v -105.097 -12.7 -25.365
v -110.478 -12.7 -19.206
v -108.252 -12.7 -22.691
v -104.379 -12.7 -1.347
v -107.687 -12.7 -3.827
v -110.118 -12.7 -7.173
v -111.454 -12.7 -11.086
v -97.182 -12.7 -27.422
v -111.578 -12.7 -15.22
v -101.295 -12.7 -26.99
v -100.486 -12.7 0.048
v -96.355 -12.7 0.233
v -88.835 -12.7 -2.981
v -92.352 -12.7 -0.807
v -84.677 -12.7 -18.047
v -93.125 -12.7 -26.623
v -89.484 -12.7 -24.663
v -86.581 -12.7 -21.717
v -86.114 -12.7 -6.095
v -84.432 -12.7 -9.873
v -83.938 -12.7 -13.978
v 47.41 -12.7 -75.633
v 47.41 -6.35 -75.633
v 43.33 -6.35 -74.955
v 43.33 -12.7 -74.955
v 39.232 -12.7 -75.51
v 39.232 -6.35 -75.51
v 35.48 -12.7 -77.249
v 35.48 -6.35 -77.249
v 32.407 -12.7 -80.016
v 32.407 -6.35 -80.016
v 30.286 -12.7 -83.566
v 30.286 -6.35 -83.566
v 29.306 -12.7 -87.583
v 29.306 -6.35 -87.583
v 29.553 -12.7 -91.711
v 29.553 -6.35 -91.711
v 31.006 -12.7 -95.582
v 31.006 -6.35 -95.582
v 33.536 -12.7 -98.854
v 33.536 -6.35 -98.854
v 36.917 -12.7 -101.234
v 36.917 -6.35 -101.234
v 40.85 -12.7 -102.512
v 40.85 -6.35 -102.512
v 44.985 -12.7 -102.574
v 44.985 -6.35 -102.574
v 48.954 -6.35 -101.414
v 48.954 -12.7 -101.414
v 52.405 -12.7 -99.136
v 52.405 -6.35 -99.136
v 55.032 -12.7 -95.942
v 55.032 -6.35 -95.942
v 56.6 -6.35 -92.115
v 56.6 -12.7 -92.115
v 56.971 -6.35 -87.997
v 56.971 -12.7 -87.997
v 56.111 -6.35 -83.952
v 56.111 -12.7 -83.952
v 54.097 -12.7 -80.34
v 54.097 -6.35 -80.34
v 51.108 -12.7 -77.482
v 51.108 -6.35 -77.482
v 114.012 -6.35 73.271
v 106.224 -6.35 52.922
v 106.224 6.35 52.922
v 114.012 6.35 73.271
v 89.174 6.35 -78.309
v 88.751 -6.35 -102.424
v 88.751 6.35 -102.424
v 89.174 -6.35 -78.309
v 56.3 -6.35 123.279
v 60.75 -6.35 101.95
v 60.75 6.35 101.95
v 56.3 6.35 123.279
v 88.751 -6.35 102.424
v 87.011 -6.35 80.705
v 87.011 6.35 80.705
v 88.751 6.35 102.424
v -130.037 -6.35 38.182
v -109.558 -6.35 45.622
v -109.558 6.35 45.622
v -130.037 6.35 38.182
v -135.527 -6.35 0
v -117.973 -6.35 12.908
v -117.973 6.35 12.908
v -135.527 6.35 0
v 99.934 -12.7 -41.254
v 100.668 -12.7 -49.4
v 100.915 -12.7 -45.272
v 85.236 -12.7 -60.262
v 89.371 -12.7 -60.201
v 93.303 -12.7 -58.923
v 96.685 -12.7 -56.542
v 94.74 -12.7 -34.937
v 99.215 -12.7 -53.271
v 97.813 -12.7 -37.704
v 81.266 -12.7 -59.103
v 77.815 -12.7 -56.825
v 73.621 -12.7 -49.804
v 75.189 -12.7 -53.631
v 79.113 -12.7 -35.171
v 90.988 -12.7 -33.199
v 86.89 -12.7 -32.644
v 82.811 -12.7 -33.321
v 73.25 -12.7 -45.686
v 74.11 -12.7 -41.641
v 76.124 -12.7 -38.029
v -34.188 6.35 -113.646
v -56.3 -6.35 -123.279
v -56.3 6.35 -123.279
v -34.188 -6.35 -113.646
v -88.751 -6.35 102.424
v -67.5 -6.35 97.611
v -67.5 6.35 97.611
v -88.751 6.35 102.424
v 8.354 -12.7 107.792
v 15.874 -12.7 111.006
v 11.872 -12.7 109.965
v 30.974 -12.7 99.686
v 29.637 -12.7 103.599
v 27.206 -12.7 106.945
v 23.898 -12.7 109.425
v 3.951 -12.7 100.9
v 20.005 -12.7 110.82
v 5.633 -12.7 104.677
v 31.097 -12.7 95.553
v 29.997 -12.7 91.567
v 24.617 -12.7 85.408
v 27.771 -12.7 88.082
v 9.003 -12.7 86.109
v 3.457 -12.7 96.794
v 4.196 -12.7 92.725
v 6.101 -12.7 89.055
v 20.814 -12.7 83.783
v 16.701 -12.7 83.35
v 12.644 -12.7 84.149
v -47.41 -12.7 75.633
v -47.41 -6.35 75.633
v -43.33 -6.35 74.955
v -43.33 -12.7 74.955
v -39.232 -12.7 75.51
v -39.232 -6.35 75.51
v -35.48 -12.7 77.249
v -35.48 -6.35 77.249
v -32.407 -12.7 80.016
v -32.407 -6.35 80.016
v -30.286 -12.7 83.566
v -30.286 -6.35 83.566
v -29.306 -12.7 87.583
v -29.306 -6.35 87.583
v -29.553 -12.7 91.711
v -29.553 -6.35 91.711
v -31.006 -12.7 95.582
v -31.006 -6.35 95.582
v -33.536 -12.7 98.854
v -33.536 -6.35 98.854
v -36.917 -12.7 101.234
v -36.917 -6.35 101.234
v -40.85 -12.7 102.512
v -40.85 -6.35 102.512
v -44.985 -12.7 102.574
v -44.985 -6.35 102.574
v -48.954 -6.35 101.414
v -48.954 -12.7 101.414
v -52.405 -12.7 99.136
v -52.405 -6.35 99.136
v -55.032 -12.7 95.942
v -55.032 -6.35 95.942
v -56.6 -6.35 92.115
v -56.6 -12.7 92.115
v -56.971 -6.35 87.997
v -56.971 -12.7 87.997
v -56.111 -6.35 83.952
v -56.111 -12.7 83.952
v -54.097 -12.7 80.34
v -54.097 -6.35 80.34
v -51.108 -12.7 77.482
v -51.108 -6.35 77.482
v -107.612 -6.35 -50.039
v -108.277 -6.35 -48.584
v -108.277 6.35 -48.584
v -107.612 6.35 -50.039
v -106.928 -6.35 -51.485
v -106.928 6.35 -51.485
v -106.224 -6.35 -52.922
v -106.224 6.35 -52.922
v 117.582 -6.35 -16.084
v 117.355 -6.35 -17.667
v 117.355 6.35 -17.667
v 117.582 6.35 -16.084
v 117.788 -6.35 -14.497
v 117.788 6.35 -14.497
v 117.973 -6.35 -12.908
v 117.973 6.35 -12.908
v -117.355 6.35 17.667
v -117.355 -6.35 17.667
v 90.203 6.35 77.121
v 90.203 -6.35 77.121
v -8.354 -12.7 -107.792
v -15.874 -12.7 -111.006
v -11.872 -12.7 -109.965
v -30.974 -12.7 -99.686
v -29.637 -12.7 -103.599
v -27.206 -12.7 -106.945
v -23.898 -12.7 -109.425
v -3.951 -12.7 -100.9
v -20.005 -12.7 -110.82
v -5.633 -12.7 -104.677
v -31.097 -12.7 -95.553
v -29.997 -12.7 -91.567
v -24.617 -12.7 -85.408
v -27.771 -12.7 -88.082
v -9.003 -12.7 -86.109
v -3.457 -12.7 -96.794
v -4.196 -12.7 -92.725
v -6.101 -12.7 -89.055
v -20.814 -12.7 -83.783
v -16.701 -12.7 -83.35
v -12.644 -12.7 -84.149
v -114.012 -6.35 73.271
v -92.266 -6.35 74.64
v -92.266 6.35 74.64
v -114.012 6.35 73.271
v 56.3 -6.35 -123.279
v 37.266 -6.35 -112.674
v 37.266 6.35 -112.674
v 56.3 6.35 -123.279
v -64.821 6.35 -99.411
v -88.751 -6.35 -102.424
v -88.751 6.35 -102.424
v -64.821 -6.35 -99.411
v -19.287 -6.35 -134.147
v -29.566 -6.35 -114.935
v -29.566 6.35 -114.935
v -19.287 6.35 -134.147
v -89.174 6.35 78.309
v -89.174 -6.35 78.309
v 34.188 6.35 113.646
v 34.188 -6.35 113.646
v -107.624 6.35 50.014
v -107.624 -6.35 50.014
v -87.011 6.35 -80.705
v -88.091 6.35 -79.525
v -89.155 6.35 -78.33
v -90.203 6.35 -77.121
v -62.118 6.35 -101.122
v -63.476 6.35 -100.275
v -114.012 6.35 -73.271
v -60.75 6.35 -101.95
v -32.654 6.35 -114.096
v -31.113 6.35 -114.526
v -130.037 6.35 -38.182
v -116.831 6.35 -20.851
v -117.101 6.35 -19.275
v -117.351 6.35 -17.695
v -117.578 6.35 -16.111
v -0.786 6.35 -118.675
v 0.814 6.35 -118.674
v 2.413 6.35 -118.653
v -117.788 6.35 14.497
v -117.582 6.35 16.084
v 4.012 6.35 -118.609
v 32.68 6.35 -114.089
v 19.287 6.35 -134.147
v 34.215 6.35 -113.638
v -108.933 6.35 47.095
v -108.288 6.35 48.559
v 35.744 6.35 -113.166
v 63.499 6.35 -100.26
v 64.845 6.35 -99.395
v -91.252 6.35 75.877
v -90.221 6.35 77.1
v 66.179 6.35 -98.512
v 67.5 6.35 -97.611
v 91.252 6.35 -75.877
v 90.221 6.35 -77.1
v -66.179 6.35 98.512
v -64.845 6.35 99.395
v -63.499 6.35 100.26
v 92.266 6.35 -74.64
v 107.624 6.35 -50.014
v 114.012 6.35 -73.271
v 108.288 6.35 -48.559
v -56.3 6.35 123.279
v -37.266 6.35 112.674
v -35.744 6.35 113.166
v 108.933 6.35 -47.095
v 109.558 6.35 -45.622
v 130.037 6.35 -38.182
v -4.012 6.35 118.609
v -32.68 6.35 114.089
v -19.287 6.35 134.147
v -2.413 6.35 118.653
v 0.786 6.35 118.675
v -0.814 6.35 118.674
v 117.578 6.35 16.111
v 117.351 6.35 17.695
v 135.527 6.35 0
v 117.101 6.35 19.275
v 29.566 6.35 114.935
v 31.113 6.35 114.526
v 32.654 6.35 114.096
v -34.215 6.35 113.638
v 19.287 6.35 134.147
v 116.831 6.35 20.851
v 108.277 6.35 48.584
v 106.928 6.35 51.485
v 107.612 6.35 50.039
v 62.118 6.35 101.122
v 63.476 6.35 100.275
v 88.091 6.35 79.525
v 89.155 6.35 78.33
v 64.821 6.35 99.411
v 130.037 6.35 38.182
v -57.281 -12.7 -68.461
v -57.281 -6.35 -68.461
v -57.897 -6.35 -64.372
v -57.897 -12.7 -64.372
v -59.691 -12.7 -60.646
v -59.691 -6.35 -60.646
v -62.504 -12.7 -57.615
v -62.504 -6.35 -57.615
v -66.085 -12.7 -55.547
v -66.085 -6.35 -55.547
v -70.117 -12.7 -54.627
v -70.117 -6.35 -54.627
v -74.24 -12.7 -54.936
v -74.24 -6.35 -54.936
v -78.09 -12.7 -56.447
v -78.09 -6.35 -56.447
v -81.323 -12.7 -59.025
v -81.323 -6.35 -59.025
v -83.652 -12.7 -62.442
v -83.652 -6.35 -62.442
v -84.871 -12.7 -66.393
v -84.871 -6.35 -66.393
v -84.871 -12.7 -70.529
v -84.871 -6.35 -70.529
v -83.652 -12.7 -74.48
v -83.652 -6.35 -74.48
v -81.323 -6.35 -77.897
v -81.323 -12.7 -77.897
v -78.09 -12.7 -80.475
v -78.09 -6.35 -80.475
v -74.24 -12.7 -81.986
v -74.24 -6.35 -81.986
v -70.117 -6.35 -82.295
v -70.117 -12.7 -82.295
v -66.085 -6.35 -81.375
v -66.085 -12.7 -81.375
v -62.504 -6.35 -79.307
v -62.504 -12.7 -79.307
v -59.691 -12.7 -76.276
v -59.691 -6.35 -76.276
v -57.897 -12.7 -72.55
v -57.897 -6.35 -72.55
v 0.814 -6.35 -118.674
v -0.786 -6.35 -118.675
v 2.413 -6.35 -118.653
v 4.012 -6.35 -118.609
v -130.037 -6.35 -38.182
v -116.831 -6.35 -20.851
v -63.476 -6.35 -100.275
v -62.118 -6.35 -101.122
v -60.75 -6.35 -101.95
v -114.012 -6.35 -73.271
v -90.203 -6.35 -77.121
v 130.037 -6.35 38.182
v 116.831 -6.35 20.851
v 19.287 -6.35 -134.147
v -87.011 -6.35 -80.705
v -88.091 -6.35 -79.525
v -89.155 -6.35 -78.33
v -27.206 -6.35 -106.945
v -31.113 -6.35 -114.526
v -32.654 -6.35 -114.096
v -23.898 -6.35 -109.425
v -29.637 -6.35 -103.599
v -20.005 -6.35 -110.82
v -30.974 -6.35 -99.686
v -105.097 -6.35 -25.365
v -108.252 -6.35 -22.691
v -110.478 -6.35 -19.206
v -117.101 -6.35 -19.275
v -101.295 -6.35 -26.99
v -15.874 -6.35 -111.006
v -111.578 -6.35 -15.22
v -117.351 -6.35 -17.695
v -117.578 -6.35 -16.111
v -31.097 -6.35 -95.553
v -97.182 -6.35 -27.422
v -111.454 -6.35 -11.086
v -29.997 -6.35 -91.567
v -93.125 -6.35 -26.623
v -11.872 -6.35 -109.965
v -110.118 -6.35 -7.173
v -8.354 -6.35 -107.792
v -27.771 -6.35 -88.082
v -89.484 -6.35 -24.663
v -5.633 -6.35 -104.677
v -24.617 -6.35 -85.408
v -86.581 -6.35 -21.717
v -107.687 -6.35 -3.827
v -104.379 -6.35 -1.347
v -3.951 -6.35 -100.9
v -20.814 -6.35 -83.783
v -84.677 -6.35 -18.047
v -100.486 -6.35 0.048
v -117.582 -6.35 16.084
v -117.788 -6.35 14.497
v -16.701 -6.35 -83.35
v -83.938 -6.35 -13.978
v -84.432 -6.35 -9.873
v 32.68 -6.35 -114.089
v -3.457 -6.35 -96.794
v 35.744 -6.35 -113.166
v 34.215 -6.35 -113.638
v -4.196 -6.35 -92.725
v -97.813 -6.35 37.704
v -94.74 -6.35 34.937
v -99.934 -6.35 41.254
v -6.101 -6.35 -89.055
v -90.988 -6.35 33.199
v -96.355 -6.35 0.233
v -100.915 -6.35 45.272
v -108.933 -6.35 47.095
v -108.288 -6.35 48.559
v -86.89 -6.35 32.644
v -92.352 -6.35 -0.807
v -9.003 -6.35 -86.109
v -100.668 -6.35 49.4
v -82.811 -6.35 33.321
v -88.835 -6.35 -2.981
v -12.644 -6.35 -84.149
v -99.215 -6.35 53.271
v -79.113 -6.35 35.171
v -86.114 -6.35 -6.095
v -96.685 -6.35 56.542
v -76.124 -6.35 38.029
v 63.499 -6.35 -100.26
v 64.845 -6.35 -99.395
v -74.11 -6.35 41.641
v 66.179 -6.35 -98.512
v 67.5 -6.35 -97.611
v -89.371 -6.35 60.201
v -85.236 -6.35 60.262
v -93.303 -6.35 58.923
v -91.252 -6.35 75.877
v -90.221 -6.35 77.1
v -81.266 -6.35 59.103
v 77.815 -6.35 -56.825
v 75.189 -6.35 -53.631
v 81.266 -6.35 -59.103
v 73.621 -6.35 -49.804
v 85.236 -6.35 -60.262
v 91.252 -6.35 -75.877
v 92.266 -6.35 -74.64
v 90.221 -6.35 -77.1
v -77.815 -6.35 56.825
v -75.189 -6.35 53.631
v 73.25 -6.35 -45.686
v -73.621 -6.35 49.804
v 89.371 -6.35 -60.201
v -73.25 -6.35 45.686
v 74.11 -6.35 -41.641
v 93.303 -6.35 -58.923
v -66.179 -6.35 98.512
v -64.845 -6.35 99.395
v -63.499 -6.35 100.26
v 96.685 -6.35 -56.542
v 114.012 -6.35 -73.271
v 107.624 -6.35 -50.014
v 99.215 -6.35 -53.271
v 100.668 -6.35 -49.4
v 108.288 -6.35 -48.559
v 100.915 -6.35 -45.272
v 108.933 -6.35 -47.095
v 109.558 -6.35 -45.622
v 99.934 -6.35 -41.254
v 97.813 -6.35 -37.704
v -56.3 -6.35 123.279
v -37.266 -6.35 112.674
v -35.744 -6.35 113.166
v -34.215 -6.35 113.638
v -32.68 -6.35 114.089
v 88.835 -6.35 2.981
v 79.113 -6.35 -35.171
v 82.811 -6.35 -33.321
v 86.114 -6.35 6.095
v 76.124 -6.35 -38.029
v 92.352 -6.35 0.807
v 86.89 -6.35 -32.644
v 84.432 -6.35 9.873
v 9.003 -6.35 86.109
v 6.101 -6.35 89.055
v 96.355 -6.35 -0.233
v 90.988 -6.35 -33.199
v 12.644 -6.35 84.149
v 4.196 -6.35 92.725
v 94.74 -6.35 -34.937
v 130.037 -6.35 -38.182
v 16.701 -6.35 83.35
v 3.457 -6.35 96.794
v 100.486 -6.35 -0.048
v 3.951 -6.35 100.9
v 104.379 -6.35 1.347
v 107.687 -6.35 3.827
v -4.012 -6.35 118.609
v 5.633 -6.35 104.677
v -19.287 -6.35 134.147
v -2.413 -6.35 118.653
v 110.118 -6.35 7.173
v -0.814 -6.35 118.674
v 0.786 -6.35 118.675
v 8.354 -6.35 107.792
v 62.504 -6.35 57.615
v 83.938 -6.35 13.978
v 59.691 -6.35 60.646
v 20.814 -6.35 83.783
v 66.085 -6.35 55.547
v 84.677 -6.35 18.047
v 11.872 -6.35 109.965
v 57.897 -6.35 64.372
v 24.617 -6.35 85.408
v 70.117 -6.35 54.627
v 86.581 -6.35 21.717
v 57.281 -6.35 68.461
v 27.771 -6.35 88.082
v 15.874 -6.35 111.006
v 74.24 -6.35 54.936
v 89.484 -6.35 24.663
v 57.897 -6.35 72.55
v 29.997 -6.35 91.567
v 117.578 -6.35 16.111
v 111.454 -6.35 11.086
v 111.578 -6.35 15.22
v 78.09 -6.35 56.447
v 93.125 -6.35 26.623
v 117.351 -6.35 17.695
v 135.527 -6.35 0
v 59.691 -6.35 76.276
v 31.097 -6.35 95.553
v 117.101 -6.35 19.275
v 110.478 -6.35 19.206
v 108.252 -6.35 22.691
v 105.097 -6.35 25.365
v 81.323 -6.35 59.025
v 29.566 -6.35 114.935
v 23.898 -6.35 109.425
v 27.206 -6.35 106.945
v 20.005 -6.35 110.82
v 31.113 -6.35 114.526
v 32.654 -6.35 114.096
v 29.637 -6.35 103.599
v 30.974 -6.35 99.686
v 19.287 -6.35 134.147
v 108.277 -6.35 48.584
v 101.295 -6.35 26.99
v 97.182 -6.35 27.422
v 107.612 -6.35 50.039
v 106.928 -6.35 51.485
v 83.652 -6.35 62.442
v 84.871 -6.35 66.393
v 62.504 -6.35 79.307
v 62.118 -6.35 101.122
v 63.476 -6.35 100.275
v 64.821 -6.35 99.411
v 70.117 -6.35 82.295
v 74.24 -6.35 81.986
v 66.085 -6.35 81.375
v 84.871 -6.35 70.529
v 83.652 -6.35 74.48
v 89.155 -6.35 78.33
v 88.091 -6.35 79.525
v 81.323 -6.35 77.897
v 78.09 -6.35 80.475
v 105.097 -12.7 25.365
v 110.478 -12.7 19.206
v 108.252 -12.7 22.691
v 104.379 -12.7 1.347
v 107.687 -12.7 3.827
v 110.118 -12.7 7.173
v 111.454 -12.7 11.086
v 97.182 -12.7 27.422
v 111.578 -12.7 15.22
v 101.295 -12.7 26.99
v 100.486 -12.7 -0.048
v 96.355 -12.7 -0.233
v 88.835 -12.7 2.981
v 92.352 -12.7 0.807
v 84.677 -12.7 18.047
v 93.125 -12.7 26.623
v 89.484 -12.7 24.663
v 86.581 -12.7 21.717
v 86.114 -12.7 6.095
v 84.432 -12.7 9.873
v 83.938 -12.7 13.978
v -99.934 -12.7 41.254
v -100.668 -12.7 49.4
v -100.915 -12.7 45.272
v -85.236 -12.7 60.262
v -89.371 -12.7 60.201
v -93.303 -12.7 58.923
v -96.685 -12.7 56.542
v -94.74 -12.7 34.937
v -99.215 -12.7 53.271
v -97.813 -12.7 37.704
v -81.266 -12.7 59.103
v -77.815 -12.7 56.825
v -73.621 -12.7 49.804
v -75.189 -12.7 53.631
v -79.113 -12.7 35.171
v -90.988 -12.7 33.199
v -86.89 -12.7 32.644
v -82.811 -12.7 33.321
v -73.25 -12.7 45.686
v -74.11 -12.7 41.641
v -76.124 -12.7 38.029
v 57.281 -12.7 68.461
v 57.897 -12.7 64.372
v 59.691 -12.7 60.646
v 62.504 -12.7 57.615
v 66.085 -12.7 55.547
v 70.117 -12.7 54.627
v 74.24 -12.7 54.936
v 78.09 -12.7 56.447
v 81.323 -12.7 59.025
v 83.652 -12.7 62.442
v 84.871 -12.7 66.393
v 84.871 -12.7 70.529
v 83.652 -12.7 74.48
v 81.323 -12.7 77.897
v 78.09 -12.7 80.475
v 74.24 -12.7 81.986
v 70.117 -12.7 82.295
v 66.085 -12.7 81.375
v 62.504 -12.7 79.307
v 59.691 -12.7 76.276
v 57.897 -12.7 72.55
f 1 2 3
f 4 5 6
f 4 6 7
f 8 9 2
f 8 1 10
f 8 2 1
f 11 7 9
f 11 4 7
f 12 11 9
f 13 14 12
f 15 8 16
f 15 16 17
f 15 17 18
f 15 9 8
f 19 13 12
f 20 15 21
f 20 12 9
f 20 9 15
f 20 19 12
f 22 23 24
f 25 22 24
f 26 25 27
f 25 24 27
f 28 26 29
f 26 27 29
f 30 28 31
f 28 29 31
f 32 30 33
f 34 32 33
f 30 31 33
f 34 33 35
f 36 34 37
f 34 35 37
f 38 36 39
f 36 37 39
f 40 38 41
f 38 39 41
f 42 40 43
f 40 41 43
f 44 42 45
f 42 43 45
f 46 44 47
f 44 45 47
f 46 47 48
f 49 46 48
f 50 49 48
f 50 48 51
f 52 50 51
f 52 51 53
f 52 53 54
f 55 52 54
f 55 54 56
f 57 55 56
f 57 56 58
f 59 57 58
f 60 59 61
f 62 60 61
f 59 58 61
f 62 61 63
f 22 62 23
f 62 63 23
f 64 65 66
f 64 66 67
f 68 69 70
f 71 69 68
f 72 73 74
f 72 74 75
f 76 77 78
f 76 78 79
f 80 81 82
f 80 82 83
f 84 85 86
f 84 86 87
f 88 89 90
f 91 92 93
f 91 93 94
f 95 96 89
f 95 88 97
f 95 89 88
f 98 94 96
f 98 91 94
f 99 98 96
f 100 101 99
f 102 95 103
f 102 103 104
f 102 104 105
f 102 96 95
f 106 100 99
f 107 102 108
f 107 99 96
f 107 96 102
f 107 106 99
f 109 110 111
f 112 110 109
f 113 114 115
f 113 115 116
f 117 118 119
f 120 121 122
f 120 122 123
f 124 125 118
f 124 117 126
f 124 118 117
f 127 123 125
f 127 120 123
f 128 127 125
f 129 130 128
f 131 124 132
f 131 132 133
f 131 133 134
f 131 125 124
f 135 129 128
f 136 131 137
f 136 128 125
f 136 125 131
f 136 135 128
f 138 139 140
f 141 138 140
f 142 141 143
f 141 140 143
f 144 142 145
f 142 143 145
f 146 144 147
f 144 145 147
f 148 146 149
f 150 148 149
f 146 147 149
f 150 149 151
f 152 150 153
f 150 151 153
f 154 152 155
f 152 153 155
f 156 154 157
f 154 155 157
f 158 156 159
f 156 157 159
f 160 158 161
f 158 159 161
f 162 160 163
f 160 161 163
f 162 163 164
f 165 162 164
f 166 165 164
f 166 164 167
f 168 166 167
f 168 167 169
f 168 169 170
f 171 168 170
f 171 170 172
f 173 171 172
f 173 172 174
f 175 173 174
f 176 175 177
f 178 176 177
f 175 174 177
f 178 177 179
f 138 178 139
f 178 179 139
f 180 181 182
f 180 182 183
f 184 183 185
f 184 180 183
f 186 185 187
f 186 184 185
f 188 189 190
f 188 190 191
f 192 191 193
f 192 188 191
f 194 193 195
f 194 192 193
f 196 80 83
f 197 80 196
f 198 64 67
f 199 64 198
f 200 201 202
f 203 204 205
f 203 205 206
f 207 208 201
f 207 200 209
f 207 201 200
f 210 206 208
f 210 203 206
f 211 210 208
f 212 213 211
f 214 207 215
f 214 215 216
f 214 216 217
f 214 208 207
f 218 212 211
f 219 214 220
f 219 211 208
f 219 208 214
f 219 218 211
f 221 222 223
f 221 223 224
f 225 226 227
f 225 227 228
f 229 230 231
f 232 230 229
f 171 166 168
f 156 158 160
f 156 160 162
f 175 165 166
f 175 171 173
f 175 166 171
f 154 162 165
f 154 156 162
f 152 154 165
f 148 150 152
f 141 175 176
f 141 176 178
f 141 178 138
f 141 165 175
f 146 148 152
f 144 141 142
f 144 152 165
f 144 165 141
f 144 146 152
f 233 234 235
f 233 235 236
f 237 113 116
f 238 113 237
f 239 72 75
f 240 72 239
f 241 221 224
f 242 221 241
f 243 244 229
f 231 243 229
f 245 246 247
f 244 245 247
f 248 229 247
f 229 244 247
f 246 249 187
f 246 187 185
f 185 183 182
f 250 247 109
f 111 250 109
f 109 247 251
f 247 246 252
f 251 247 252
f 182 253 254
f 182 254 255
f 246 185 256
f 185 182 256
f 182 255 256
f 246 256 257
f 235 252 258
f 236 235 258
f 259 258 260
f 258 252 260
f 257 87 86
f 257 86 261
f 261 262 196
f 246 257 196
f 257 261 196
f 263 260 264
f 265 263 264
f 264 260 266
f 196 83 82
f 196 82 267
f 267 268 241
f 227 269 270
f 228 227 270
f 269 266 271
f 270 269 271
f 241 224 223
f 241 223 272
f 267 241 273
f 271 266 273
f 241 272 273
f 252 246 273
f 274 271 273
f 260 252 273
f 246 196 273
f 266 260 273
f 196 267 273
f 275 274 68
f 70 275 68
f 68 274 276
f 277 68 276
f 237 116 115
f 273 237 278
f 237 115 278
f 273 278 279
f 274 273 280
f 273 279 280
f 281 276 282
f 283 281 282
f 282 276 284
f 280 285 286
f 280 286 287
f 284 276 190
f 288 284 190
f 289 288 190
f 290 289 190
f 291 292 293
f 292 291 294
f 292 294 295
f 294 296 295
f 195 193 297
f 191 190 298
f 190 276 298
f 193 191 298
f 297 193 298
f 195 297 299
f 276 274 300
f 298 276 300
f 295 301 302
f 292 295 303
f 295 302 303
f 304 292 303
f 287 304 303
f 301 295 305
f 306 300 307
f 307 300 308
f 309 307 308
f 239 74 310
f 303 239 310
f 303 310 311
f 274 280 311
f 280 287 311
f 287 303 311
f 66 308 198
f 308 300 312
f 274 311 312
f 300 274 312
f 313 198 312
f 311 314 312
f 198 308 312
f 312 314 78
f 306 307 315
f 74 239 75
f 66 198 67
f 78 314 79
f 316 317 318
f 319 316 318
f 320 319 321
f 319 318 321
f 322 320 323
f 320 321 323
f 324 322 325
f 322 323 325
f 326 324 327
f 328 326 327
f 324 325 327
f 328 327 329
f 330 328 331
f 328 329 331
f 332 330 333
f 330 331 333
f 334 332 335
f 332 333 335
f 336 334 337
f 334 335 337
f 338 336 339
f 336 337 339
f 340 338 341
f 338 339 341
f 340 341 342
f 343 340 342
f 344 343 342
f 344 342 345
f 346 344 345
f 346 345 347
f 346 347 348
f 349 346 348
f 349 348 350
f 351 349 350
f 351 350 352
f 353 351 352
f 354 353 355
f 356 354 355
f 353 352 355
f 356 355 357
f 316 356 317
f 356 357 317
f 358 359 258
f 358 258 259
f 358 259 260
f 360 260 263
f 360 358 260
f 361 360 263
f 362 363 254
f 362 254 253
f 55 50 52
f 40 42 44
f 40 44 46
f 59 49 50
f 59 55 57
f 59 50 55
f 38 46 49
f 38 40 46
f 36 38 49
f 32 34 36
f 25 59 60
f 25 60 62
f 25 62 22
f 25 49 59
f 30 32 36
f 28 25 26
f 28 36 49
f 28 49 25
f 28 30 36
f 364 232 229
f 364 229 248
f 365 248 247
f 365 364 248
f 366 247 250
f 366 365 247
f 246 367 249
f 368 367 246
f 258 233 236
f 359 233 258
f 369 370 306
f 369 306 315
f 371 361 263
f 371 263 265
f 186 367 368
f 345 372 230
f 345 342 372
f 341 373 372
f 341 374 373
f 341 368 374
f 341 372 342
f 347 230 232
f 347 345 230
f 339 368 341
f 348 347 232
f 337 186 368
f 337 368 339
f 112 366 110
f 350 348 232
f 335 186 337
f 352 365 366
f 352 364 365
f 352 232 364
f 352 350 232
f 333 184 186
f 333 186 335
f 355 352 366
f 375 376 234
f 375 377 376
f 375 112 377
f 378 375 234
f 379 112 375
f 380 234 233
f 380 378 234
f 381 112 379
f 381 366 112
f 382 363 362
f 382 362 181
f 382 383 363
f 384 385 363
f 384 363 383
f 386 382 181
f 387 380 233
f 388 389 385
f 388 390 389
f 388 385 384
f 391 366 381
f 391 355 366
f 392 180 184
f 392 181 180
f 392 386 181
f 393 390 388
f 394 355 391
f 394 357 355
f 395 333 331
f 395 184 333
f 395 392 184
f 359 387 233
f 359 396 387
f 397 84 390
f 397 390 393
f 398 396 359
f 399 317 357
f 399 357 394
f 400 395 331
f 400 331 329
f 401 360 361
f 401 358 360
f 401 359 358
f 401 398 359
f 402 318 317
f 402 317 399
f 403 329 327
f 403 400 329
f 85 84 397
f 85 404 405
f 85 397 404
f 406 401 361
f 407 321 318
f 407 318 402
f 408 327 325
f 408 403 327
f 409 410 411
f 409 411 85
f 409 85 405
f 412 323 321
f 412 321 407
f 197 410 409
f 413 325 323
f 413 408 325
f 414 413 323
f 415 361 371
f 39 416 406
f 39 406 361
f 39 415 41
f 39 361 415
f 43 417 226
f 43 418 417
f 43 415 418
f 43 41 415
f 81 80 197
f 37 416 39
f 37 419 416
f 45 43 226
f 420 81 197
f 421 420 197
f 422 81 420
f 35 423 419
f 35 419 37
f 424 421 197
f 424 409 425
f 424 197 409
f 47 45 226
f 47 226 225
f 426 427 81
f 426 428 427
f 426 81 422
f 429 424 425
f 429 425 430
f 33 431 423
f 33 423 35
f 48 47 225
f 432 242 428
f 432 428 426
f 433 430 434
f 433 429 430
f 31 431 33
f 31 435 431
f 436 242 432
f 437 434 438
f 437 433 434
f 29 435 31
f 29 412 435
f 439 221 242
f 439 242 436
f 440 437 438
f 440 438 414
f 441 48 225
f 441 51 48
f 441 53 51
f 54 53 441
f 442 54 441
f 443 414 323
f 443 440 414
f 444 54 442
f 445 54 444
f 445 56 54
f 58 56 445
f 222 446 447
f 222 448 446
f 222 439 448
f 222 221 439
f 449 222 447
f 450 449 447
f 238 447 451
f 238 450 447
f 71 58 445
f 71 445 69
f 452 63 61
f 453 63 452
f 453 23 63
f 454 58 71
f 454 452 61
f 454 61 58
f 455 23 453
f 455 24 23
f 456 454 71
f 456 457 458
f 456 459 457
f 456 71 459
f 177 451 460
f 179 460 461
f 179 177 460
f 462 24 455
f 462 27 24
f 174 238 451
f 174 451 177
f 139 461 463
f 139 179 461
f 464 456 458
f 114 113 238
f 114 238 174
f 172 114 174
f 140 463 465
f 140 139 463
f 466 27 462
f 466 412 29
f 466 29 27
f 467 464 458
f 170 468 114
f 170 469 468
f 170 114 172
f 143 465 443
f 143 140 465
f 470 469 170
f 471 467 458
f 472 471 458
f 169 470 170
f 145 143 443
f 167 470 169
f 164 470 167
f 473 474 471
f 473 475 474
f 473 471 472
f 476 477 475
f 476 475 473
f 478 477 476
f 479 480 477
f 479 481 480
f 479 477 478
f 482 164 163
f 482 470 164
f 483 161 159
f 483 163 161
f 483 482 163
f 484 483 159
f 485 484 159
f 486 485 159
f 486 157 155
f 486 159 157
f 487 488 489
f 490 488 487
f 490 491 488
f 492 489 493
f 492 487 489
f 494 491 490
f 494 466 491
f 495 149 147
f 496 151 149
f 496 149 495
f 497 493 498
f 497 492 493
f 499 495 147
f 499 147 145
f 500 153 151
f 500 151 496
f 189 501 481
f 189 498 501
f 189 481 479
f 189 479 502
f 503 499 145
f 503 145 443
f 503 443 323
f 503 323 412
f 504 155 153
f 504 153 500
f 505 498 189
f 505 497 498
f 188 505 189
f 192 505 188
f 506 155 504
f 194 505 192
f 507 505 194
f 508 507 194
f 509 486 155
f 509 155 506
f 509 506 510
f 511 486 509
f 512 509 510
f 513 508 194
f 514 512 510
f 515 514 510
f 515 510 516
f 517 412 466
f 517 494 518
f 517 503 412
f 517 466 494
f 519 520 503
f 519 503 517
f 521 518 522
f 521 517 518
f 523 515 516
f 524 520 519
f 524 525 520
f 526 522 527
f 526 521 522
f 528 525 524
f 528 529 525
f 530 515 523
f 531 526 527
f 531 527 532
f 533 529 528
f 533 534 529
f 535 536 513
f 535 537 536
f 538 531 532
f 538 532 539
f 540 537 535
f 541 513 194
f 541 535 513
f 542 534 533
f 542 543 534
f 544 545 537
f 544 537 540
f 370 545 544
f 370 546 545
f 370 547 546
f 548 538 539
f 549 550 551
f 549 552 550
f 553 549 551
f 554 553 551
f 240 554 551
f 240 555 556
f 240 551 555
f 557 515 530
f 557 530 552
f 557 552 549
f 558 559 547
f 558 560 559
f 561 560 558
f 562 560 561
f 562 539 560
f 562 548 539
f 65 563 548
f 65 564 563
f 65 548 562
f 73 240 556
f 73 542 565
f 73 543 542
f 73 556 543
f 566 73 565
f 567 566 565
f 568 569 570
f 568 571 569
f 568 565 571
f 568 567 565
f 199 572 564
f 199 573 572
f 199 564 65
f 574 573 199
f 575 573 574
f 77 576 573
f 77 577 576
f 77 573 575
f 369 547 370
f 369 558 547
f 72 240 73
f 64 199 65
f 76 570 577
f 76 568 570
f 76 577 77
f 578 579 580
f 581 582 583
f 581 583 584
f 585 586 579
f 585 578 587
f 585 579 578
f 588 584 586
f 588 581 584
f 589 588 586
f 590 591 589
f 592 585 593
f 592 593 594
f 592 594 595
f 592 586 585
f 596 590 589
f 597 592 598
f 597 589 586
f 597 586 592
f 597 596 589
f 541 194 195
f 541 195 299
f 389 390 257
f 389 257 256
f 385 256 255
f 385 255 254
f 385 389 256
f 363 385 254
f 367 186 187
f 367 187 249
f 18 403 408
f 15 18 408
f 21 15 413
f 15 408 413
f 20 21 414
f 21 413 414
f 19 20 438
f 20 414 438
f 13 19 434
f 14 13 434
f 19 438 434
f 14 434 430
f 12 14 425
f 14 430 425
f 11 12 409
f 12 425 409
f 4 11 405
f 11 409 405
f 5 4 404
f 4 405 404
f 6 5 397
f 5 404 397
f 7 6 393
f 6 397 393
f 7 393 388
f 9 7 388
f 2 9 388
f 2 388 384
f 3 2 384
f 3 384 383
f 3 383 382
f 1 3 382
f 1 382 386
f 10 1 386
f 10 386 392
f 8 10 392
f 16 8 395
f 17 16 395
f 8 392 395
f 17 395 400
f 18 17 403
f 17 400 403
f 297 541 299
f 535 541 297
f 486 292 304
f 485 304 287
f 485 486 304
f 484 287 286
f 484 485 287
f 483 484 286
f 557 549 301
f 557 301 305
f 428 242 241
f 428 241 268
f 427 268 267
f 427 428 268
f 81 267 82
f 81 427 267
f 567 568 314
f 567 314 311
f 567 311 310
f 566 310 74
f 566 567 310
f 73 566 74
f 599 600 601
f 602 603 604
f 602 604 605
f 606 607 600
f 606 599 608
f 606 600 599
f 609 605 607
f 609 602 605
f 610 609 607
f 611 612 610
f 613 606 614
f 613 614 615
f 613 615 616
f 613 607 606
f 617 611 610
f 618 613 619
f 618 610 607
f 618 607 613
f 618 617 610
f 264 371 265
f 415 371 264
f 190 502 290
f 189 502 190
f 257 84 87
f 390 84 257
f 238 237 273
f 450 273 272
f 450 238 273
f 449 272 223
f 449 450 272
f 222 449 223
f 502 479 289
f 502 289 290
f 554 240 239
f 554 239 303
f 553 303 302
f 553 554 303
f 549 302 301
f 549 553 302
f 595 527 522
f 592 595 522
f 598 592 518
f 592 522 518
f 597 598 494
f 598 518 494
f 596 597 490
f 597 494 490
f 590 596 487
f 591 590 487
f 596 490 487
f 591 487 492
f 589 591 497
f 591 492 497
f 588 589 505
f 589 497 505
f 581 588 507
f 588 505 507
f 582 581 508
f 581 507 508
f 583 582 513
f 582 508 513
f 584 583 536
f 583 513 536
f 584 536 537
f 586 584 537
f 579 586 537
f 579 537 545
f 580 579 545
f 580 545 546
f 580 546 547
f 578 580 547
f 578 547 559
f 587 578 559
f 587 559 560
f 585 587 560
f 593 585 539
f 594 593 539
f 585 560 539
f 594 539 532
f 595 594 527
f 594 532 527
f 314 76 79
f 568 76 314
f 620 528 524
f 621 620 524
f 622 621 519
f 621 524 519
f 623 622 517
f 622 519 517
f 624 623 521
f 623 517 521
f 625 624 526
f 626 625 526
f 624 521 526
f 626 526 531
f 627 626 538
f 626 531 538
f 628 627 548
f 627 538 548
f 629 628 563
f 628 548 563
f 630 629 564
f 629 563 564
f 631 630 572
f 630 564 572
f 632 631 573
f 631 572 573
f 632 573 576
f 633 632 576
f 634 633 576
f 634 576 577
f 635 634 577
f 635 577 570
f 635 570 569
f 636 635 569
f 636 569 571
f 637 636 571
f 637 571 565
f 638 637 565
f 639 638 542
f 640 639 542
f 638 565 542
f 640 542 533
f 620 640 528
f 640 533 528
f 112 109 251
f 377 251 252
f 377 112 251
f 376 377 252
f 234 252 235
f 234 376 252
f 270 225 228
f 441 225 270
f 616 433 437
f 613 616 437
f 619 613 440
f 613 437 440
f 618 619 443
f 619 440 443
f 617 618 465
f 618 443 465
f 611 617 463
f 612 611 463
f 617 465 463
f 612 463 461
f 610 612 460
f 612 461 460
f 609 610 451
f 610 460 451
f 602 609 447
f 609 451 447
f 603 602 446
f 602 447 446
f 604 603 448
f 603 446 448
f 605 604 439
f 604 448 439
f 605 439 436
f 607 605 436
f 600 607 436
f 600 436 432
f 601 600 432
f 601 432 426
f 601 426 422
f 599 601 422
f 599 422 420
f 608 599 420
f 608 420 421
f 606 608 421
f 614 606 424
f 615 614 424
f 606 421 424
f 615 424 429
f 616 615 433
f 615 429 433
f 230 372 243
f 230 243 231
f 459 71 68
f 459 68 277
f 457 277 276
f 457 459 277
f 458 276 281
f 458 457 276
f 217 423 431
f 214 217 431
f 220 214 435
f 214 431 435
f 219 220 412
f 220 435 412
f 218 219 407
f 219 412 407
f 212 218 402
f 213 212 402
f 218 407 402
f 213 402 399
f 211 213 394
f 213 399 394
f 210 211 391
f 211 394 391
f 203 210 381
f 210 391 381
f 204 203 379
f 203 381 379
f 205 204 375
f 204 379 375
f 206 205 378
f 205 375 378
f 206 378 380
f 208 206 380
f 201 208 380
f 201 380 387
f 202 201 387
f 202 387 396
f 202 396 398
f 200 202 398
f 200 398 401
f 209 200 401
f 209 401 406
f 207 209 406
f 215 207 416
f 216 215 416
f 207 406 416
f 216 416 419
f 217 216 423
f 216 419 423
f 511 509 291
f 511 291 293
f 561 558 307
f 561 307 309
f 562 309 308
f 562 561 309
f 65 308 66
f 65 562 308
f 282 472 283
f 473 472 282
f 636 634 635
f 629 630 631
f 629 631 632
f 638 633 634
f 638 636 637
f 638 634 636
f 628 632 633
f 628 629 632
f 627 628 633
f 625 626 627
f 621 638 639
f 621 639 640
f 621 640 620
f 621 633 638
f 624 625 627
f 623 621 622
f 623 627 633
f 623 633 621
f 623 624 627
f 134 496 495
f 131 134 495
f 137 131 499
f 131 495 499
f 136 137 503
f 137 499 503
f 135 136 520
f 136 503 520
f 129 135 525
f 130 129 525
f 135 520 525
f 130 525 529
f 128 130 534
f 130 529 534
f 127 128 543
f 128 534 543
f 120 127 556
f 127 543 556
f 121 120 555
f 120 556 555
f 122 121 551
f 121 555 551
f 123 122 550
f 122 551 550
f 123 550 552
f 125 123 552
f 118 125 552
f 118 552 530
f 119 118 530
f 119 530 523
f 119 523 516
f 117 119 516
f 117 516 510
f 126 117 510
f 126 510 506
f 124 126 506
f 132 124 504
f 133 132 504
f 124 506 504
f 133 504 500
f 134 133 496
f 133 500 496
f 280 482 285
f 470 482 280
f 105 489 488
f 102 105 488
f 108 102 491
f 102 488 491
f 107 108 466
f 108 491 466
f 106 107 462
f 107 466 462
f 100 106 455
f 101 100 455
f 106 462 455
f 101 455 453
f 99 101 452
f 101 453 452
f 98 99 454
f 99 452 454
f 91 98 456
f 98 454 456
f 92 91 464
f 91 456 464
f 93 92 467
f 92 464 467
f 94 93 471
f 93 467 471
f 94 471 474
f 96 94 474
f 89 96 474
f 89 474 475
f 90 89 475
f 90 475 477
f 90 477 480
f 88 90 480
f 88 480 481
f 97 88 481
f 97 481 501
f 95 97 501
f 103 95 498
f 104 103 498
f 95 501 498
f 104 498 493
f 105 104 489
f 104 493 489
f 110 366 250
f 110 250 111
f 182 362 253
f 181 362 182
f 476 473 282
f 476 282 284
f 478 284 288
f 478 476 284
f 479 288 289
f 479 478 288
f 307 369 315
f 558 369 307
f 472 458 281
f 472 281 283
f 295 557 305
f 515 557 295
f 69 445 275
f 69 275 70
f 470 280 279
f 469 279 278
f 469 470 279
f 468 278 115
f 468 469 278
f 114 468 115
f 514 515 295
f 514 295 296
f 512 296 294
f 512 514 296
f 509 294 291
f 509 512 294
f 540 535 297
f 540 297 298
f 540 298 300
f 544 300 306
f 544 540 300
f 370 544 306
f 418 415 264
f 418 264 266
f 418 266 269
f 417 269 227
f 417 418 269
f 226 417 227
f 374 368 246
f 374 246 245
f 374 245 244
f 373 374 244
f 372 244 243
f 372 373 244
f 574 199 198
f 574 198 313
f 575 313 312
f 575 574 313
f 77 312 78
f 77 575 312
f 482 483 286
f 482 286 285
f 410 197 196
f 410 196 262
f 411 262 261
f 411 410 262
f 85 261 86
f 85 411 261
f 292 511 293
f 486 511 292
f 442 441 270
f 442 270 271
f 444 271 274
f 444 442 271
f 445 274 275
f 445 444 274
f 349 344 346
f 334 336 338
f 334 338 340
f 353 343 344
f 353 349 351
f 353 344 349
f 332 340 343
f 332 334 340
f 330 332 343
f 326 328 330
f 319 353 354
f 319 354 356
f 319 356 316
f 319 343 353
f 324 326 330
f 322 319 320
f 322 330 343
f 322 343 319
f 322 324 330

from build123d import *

# Parameters (mm, degrees)
F0_R            = 118.6771656213
F1_DEPTH        = 6.35
F2_R            = 13.8727461935
F3_DEPTH        = 6.35
F3_COPIES_COUNT = 10
F5_DEPTH        = 12.7
F5_COPIES_COUNT = 22


# Not quite as in the source:
# - a pattern or mirror of a feature is missing from the dataset's text; its kind, count and spacing are read off the source's solid


with BuildPart() as f1:
    # F0 (on Front) → F1 (new body, symmetric)
    with BuildSketch(Plane.XZ):
        Circle(F0_R)
    extrude(amount=F1_DEPTH, both=True)

    # F2 (on face) → F3 (join)
    with BuildSketch(Plane.XZ.offset(6.35)):
        with Locations((-71.153357625, -68.4610754251)):
            Circle(F2_R)
    f3 = extrude(amount=F3_DEPTH)

    # F3_copies: F3 ×10 about axis
    f3_copies_axis = Axis((0, 0, 0), (0, 1, 0))
    for i in range(1, F3_COPIES_COUNT):
        add(f3.rotate(f3_copies_axis, i * 360 / F3_COPIES_COUNT))

    # F4 (on face) → F5 (join, through all)
    with BuildSketch(Plane.XZ.offset(6.35)):
        with BuildLine():
            Line((-135.5267614126, 0), (-117.5784646417, -16.1113094564))
            ThreePointArc((-117.5784646417, -16.1113094564), (-118.6661963279, -1.6135330732), (-117.9730534673, 12.9084582934))
            Line((-117.9730534673, 12.9084582934), (-135.5267614126, 0))
        make_face()
    f5 = extrude(amount=-F5_DEPTH)

    # F5_copies: F5 ×22 about axis
    f5_copies_axis = Axis((0, 0, 0), (0, 1, 0))
    for i in range(1, F5_COPIES_COUNT):
        add(f5.rotate(f5_copies_axis, i * 360 / F5_COPIES_COUNT))


solid = f1.part
